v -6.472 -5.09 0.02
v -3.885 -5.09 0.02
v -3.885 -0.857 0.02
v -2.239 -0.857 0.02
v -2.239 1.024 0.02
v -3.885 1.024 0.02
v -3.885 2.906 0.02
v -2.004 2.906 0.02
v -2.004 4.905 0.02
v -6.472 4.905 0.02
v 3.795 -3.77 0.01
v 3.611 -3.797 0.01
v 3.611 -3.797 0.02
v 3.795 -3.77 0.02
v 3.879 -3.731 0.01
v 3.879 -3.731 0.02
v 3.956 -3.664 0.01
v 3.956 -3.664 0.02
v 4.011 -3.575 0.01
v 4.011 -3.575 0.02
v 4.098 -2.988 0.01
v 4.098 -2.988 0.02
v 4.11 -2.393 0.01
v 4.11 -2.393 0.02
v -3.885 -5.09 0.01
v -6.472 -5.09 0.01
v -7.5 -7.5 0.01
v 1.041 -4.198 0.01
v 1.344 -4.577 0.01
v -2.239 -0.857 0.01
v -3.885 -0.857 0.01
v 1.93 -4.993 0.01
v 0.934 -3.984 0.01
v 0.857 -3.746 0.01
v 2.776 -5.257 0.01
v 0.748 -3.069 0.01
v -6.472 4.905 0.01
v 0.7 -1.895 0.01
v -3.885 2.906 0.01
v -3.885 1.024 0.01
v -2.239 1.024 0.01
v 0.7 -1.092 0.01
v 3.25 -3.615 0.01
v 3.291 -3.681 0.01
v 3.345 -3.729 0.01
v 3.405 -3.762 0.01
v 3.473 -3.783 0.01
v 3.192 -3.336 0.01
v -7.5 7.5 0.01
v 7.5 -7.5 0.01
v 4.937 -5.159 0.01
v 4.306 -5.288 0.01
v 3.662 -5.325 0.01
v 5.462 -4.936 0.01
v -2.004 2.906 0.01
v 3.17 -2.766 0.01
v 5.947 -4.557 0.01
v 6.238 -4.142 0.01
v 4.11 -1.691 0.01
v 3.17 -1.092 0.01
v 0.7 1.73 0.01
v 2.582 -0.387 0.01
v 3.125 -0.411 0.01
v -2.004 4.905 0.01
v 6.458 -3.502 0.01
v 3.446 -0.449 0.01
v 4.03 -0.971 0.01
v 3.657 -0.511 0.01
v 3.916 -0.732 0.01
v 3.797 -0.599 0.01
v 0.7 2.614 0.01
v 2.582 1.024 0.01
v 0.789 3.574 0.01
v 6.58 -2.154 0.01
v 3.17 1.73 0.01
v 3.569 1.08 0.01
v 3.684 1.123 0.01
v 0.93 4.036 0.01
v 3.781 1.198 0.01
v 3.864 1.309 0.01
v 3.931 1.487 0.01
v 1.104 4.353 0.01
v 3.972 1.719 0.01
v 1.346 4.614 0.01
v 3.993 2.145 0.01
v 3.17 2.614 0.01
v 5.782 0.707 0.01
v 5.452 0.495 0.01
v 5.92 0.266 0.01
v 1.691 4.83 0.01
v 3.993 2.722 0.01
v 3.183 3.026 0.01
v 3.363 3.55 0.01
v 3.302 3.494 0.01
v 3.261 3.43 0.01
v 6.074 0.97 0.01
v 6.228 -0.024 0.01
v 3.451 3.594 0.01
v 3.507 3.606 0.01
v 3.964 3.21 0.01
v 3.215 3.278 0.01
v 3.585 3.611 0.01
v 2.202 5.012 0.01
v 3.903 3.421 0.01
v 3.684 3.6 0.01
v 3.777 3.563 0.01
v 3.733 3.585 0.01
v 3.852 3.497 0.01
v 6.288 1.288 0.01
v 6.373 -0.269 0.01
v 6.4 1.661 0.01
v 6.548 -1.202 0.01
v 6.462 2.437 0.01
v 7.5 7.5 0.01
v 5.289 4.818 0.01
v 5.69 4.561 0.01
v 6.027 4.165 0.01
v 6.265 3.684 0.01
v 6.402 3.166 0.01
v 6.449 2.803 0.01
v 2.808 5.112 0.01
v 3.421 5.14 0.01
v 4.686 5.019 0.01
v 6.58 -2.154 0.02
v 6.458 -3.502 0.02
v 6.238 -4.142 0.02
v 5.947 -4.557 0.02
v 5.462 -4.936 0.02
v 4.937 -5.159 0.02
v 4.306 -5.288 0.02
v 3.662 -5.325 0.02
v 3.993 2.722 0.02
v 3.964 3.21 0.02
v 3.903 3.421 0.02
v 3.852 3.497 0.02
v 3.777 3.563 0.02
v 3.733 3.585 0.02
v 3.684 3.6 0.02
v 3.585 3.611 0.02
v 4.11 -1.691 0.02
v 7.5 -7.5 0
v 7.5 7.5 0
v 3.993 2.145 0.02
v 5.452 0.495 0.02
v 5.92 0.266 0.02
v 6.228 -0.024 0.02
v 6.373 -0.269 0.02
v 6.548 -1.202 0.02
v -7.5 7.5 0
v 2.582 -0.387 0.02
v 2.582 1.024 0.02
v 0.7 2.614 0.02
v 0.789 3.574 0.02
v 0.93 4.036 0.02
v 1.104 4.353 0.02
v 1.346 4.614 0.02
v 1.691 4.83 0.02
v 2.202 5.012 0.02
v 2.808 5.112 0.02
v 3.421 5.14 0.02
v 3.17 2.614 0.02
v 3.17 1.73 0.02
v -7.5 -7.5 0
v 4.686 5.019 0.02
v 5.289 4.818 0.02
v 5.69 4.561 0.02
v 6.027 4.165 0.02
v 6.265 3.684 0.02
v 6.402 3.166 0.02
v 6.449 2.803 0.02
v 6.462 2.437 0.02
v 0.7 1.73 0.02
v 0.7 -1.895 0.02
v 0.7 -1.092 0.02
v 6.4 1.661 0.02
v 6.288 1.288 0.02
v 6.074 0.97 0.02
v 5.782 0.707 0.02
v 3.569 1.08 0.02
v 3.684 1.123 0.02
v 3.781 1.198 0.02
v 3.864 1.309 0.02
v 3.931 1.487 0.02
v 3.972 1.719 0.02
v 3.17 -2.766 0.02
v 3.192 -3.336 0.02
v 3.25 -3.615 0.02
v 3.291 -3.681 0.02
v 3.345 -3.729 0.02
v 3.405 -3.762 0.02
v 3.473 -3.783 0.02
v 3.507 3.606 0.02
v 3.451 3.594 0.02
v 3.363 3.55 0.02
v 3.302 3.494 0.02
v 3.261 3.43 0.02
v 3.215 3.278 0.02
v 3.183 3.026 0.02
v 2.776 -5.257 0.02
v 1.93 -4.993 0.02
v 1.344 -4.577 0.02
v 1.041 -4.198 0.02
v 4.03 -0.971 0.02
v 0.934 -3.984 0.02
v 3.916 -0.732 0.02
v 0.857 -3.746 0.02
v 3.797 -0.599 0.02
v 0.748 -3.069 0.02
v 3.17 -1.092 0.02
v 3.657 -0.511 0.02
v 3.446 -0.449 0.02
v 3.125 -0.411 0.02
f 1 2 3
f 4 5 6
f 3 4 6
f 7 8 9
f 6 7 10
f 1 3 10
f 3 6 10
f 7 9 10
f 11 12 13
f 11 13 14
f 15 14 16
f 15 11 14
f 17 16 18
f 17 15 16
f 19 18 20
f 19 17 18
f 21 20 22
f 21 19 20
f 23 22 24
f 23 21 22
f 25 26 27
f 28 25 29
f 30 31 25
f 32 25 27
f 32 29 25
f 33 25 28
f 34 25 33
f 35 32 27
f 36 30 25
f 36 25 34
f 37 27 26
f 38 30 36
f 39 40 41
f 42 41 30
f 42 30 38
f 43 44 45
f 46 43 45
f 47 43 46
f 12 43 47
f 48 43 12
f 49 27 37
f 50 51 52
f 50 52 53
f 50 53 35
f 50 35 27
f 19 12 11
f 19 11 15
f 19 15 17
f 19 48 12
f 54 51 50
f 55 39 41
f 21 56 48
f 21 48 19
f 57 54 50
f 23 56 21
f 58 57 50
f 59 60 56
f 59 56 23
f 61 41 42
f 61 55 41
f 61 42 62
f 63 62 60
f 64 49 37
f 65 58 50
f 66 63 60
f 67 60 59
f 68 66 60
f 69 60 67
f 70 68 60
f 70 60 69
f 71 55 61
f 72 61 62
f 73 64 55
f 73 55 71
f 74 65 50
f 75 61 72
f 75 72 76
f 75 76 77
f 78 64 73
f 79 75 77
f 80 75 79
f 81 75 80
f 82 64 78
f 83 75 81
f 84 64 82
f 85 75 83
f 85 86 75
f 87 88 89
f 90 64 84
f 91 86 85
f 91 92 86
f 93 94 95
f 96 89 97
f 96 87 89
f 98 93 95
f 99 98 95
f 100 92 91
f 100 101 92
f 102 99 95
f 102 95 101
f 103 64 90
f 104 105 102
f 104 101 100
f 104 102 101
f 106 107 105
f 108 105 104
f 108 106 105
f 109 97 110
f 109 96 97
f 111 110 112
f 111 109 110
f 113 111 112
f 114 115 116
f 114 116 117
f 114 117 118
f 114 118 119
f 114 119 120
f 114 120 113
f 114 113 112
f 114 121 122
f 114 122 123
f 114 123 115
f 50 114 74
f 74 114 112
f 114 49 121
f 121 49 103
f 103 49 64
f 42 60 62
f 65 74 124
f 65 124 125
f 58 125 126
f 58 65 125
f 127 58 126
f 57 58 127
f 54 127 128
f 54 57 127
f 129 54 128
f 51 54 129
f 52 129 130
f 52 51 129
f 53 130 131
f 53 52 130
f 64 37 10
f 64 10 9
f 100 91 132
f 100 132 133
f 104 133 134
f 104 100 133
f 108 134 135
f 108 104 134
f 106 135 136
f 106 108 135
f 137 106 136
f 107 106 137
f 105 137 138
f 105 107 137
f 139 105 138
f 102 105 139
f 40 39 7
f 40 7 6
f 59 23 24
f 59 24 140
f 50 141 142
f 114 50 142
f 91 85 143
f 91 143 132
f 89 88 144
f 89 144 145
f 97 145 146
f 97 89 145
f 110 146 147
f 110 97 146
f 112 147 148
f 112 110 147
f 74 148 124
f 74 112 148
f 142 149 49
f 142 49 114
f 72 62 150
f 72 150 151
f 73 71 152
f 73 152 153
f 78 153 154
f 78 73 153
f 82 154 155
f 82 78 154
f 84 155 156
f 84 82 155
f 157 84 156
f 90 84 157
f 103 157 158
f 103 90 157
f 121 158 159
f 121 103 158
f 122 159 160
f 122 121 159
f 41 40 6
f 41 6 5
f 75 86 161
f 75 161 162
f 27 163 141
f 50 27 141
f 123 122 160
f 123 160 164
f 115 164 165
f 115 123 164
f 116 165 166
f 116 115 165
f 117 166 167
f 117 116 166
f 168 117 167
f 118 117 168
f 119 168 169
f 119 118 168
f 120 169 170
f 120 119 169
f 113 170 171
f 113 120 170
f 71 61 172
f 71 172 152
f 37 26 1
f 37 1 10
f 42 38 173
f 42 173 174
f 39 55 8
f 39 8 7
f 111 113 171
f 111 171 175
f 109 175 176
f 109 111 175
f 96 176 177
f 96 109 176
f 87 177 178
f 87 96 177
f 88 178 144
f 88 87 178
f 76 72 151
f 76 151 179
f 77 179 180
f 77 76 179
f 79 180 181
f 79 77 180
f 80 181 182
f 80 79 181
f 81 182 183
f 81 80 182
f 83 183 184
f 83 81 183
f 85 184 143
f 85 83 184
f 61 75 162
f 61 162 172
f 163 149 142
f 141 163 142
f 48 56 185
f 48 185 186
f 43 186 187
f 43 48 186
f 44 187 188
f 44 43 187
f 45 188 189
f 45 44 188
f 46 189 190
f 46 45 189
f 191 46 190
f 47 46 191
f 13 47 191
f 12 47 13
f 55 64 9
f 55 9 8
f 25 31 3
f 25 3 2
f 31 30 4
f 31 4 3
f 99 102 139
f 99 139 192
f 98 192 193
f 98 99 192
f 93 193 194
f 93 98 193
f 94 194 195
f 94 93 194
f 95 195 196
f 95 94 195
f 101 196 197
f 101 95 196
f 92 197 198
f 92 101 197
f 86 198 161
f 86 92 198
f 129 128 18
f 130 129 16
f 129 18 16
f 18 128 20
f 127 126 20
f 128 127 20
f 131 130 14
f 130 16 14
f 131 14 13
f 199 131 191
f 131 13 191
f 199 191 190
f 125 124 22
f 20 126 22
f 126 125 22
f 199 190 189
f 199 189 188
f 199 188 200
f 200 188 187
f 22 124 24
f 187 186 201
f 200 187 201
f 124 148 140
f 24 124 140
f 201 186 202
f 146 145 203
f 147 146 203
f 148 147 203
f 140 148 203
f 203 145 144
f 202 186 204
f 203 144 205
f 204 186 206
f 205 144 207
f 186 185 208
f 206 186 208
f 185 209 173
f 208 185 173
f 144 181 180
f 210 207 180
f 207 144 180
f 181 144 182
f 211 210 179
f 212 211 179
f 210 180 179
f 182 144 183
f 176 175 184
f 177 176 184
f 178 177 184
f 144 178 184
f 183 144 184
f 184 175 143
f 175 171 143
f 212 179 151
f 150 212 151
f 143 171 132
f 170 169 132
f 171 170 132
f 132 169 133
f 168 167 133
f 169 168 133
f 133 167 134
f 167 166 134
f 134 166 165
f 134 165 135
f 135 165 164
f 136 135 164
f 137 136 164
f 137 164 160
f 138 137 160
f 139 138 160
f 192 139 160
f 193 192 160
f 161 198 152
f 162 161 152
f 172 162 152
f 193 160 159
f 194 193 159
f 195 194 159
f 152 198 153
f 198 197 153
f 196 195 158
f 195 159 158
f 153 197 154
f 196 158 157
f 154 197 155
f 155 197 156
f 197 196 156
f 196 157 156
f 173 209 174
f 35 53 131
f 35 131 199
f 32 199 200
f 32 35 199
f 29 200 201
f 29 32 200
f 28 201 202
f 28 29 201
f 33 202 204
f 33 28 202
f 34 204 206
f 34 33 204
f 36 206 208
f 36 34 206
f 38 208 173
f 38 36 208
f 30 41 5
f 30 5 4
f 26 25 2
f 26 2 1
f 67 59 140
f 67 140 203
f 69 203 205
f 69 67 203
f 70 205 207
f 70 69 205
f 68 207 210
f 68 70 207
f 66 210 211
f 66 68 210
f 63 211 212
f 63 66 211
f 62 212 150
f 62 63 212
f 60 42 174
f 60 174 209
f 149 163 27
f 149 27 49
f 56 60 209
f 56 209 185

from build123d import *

# Parameters (mm, degrees)
SKETCH1_W           = 15
SKETCH1_H           = 15
BASE_EXTRUDE_DEPTH  = 0.01
BOSS_EXTRUDE1_DEPTH = 0.01


with BuildPart() as part:
    # Sketch1 → Base-Extrude (new body)
    with BuildSketch(Plane.XY):
        Rectangle(SKETCH1_W, SKETCH1_H)
    extrude(amount=BASE_EXTRUDE_DEPTH)

    # Sketch3 → Boss-Extrude1 (add)
    with BuildSketch(Plane.XY.offset(0.01)):
        Polygon((-6.472368832, 4.904808961), (-2.004055241, 4.904808961), (-2.004055241, 2.905826565), (-3.885450437, 2.905826565), (-3.885450437, 1.024431369), (-2.239229641, 1.024431369), (-2.239229641, -0.856963827), (-3.885450437, -0.856963827), (-3.885450437, -5.090103018), (-6.472368832, -5.090103018), align=None)
        with BuildLine():
            add(Edge.make_bspline(
                [(5.451708144, 0.49528897), (5.541704888, 0.46122907), (5.71609099, 0.395231423), (5.951267823, 0.254576822), (6.147281493, 0.079818861), (6.285825692, -0.092074441), (6.374221532, -0.261448951), (6.429491004, -0.425746475), (6.47634556, -0.625108119), (6.513333341, -0.861085485), (6.54456131, -1.13319291), (6.565545199, -1.441559516), (6.578417743, -1.785912523), (6.579330792, -2.027310906), (6.579810341, -2.154097624)],
                knots=[0, 0, 0, 0, 0.000288316, 0.000558667, 0.000816374, 0.001072913, 0.001215904, 0.001387325, 0.001591423, 0.001829741, 0.00210345, 0.002412902, 0.002756718, 0.003137057, 0.003137057, 0.003137057, 0.003137057], degree=3))
            add(Edge.make_bspline(
                [(6.579810341, -2.154097624), (6.579251611, -2.249649366), (6.578162254, -2.43594664), (6.565520748, -2.706880939), (6.542845162, -2.961695301), (6.514955923, -3.199828398), (6.475365682, -3.421508825), (6.4310113, -3.62688384), (6.375382308, -3.815865386), (6.311376041, -3.989219646), (6.237022264, -4.149908829), (6.151069105, -4.299319941), (6.050020595, -4.437378887), (5.940700172, -4.568709379), (5.816810406, -4.688656507), (5.679099503, -4.797101345), (5.531093612, -4.8981779), (5.370194177, -4.988868629), (5.196816475, -5.066913302), (5.012561471, -5.137635874), (4.815842154, -5.195751498), (4.60781307, -5.243417124), (4.388177835, -5.280292834), (4.156835455, -5.304852901), (3.913544341, -5.322479956), (3.747340028, -5.324329647), (3.662177947, -5.325277418)],
                knots=[0, 0, 0, 0, 0.000286642, 0.000558867, 0.000813371, 0.001054022, 0.001277849, 0.00148869, 0.001684033, 0.001868322, 0.002042585, 0.002214645, 0.002384444, 0.002555234, 0.002726743, 0.002900628, 0.003080515, 0.003263969, 0.003453887, 0.003650436, 0.00385563, 0.00406867, 0.004290375, 0.004523299, 0.004766386, 0.00502183, 0.00502183, 0.00502183, 0.00502183], degree=3))
            add(Edge.make_bspline(
                [(3.662177947, -5.325277418), (3.565978307, -5.324651197), (3.37886012, -5.323433134), (3.106134323, -5.30155964), (2.848949154, -5.271730523), (2.607716343, -5.227741017), (2.382277001, -5.171023718), (2.17313853, -5.100991344), (1.978289759, -5.021364866), (1.801922322, -4.924582203), (1.641206044, -4.819500382), (1.492410404, -4.711536803), (1.360037195, -4.595479188), (1.242042252, -4.47335357), (1.136273155, -4.347507072), (1.048139978, -4.21345763), (0.971968934, -4.075729036), (0.909481566, -3.928047215), (0.860011794, -3.763274966), (0.816012679, -3.57560507), (0.780160436, -3.360743847), (0.751608695, -3.119093652), (0.727605231, -2.851386475), (0.711525112, -2.556637663), (0.702857292, -2.23499193), (0.701274259, -2.011405899), (0.700450353, -1.895038325)],
                knots=[0, 0, 0, 0, 0.000288509, 0.000561179, 0.000820291, 0.001064983, 0.001296256, 0.001517038, 0.001726208, 0.001926803, 0.002119439, 0.002302072, 0.002477849, 0.002646761, 0.002811197, 0.002970184, 0.003127228, 0.003282835, 0.003450201, 0.003642724, 0.003860806, 0.004103281, 0.004372588, 0.00466702, 0.004988679, 0.005337785, 0.005337785, 0.005337785, 0.005337785], degree=3))
            Line((0.700450353, -1.895038325), (0.700450353, -1.092138227))
            Line((0.700450353, -1.092138227), (3.169781548, -1.092138227))
            Line((3.169781548, -1.092138227), (3.169781548, -2.765918523))
            add(Edge.make_bspline(
                [(3.169781548, -2.765918523), (3.17021198, -2.8192041), (3.171028418, -2.920275499), (3.175006718, -3.064808886), (3.179443639, -3.194167412), (3.189151196, -3.308058537), (3.199429809, -3.406909766), (3.213835296, -3.49033521), (3.230278504, -3.559125937), (3.252702283, -3.629681509), (3.299526285, -3.699935045), (3.383122461, -3.757103347), (3.489245053, -3.792340524), (3.568162966, -3.79513591), (3.610733547, -3.796643821)],
                knots=[0, 0, 0, 0, 0.000159856, 0.000303212, 0.000433777, 0.000548059, 0.000646058, 0.000731843, 0.000801805, 0.000858165, 0.000953457, 0.001048288, 0.001156937, 0.001284189, 0.001284189, 0.001284189, 0.001284189], degree=3))
            add(Edge.make_bspline(
                [(3.610733547, -3.796643821), (3.657620063, -3.794138108), (3.745079031, -3.789464118), (3.864542915, -3.747227033), (3.956695696, -3.672591069), (4.011087258, -3.586195046), (4.037803626, -3.496164203), (4.058275718, -3.405442093), (4.073156686, -3.291597084), (4.088363969, -3.155701403), (4.098765536, -2.996924463), (4.105963633, -2.815589336), (4.109019718, -2.611594501), (4.109976338, -2.468276058), (4.110479146, -2.392946624)],
                knots=[0, 0, 0, 0, 0.000140406, 0.000261904, 0.000372951, 0.000490193, 0.000561659, 0.000653927, 0.000769034, 0.000905786, 0.001064178, 0.001246219, 0.001450193, 0.001676188, 0.001676188, 0.001676188, 0.001676188], degree=3))
            Line((4.110479146, -2.392946624), (4.110479146, -1.691098025))
            add(Edge.make_bspline(
                [(4.110479146, -1.691098025), (4.109713746, -1.600362341), (4.108287812, -1.431322569), (4.08194848, -1.197917545), (4.044954905, -1.001849323), (3.985393347, -0.843187957), (3.909844021, -0.715148139), (3.819006664, -0.611594312), (3.710227787, -0.532893563), (3.6058627, -0.487905925), (3.510331925, -0.461725122), (3.422645179, -0.443464033), (3.319407062, -0.429706846), (3.201185368, -0.416713215), (3.067602219, -0.406017567), (2.918750523, -0.397065261), (2.755237446, -0.389185698), (2.641261806, -0.38749592), (2.581845549, -0.386615028)],
                knots=[0, 0, 0, 0, 0.00027202, 0.00050677, 0.000703876, 0.000869029, 0.001012397, 0.001147735, 0.001279304, 0.001411755, 0.001486206, 0.00157629, 0.001680223, 0.001798512, 0.001933087, 0.002082191, 0.002245876, 0.002424132, 0.002424132, 0.002424132, 0.002424132], degree=3))
            Line((2.581845549, -0.386615028), (2.581845549, 1.024431369))
            add(Edge.make_bspline(
                [(2.581845549, 1.024431369), (2.648600291, 1.025108849), (2.775373656, 1.026395444), (2.955465308, 1.02722335), (3.115410238, 1.032245699), (3.25494493, 1.042357761), (3.374484854, 1.05083456), (3.474597157, 1.061117544), (3.554479878, 1.075150689), (3.633822017, 1.096367081), (3.714735309, 1.136821769), (3.794334463, 1.206455107), (3.86083388, 1.295680521), (3.910135048, 1.408923566), (3.948380873, 1.548008373), (3.974310757, 1.718115255), (3.99035213, 1.920723759), (3.992004522, 2.066756753), (3.992891946, 2.145184367)],
                knots=[0, 0, 0, 0, 0.000200274, 0.000380339, 0.000540279, 0.000680216, 0.000799993, 0.000899818, 0.000981984, 0.001043059, 0.001145767, 0.001249992, 0.001357659, 0.001476871, 0.0016182, 0.001789464, 0.001992242, 0.002227481, 0.002227481, 0.002227481, 0.002227481], degree=3))
            Line((3.992891946, 2.145184367), (3.992891946, 2.722096566))
            add(Edge.make_bspline(
                [(3.992891946, 2.722096566), (3.992156958, 2.80480146), (3.990815348, 2.955766705), (3.974157766, 3.158867539), (3.944994071, 3.316687903), (3.902403692, 3.434210749), (3.840573884, 3.515071041), (3.769250527, 3.573837218), (3.680406937, 3.605166698), (3.617687502, 3.609231859), (3.585011347, 3.611349764)],
                knots=[0, 0, 0, 0, 0.000248097, 0.000452863, 0.000610325, 0.000729055, 0.000823493, 0.000912446, 0.001002548, 0.001100547, 0.001100547, 0.001100547, 0.001100547], degree=3))
            add(Edge.make_bspline(
                [(3.585011347, 3.611349764), (3.547813053, 3.610036204), (3.477965928, 3.607569737), (3.383466793, 3.567715617), (3.306078747, 3.507667601), (3.261348874, 3.435575677), (3.235519365, 3.364853788), (3.21734241, 3.297266999), (3.203718057, 3.215962863), (3.190130712, 3.121726109), (3.182222609, 3.013679986), (3.174137767, 2.892462124), (3.171289987, 2.757627757), (3.17030143, 2.663301825), (3.169781548, 2.613695866)],
                knots=[0, 0, 0, 0, 0.000110788, 0.000208026, 0.000302142, 0.000400502, 0.000457487, 0.000527907, 0.000610073, 0.000704654, 0.000813443, 0.000934928, 0.001069101, 0.001217933, 0.001217933, 0.001217933, 0.001217933], degree=3))
            Line((3.169781548, 2.613695866), (3.169781548, 1.729954568))
            Line((3.169781548, 1.729954568), (0.700450353, 1.729954568))
            Line((0.700450353, 1.729954568), (0.700450353, 2.613695866))
            add(Edge.make_bspline(
                [(0.700450353, 2.613695866), (0.702730934, 2.732564889), (0.707099736, 2.960276734), (0.735480875, 3.287167866), (0.786008768, 3.583612256), (0.857824167, 3.849811851), (0.946305898, 4.087948018), (1.059181309, 4.295504083), (1.191255618, 4.474908935), (1.348525371, 4.622731781), (1.526270005, 4.747928152), (1.728535846, 4.85095263), (1.951963354, 4.9418512), (2.20006964, 5.014787074), (2.47175811, 5.07095155), (2.767736781, 5.110214139), (3.086606239, 5.13714693), (3.30751876, 5.139018027), (3.421491648, 5.139983361)],
                knots=[0, 0, 0, 0, 0.000356607, 0.000683135, 0.00098338, 0.001257483, 0.0015093, 0.001743619, 0.001964095, 0.002174624, 0.00238821, 0.002614205, 0.002854056, 0.003110989, 0.00338881, 0.003685544, 0.004006267, 0.004348084, 0.004348084, 0.004348084, 0.004348084], degree=3))
            add(Edge.make_bspline(
                [(3.421491648, 5.139983361), (3.563633857, 5.137990237), (3.836088406, 5.134169869), (4.227351116, 5.10199337), (4.582669765, 5.044753192), (4.904044762, 4.970086889), (5.188966131, 4.869258179), (5.438231113, 4.746072414), (5.652827918, 4.600640957), (5.831971731, 4.430106467), (5.980716849, 4.239615452), (6.110987367, 4.034438308), (6.218830297, 3.810094157), (6.309654456, 3.569479907), (6.376396325, 3.310417121), (6.425663584, 3.035308665), (6.45834142, 2.742475657), (6.460905417, 2.540907636), (6.462223141, 2.437315066)],
                knots=[0, 0, 0, 0, 0.000426396, 0.000817305, 0.001176449, 0.001505321, 0.001805768, 0.002081026, 0.002337368, 0.002580399, 0.002819707, 0.003060813, 0.003308147, 0.003565119, 0.003831173, 0.004109389, 0.004403185, 0.004713824, 0.004713824, 0.004713824, 0.004713824], degree=3))
            add(Edge.make_bspline(
                [(6.462223141, 2.437315066), (6.461622613, 2.368090193), (6.46046325, 2.234446478), (6.448688471, 2.04145572), (6.43314227, 1.863552201), (6.409776505, 1.700127517), (6.376800405, 1.552361275), (6.337572556, 1.418832167), (6.295732098, 1.298595255), (6.22169852, 1.159141118), (6.106697718, 0.995839339), (5.92607923, 0.81879231), (5.707966569, 0.645416236), (5.540092831, 0.547068542), (5.451708144, 0.49528897)],
                knots=[0, 0, 0, 0, 0.000207647, 0.000400879, 0.000579862, 0.000743299, 0.000895751, 0.001033548, 0.001160854, 0.00127672, 0.00150611, 0.001756853, 0.002032895, 0.002339828, 0.002339828, 0.002339828, 0.002339828], degree=3))
        make_face()
    extrude(amount=BOSS_EXTRUDE1_DEPTH)


solid = part.part
